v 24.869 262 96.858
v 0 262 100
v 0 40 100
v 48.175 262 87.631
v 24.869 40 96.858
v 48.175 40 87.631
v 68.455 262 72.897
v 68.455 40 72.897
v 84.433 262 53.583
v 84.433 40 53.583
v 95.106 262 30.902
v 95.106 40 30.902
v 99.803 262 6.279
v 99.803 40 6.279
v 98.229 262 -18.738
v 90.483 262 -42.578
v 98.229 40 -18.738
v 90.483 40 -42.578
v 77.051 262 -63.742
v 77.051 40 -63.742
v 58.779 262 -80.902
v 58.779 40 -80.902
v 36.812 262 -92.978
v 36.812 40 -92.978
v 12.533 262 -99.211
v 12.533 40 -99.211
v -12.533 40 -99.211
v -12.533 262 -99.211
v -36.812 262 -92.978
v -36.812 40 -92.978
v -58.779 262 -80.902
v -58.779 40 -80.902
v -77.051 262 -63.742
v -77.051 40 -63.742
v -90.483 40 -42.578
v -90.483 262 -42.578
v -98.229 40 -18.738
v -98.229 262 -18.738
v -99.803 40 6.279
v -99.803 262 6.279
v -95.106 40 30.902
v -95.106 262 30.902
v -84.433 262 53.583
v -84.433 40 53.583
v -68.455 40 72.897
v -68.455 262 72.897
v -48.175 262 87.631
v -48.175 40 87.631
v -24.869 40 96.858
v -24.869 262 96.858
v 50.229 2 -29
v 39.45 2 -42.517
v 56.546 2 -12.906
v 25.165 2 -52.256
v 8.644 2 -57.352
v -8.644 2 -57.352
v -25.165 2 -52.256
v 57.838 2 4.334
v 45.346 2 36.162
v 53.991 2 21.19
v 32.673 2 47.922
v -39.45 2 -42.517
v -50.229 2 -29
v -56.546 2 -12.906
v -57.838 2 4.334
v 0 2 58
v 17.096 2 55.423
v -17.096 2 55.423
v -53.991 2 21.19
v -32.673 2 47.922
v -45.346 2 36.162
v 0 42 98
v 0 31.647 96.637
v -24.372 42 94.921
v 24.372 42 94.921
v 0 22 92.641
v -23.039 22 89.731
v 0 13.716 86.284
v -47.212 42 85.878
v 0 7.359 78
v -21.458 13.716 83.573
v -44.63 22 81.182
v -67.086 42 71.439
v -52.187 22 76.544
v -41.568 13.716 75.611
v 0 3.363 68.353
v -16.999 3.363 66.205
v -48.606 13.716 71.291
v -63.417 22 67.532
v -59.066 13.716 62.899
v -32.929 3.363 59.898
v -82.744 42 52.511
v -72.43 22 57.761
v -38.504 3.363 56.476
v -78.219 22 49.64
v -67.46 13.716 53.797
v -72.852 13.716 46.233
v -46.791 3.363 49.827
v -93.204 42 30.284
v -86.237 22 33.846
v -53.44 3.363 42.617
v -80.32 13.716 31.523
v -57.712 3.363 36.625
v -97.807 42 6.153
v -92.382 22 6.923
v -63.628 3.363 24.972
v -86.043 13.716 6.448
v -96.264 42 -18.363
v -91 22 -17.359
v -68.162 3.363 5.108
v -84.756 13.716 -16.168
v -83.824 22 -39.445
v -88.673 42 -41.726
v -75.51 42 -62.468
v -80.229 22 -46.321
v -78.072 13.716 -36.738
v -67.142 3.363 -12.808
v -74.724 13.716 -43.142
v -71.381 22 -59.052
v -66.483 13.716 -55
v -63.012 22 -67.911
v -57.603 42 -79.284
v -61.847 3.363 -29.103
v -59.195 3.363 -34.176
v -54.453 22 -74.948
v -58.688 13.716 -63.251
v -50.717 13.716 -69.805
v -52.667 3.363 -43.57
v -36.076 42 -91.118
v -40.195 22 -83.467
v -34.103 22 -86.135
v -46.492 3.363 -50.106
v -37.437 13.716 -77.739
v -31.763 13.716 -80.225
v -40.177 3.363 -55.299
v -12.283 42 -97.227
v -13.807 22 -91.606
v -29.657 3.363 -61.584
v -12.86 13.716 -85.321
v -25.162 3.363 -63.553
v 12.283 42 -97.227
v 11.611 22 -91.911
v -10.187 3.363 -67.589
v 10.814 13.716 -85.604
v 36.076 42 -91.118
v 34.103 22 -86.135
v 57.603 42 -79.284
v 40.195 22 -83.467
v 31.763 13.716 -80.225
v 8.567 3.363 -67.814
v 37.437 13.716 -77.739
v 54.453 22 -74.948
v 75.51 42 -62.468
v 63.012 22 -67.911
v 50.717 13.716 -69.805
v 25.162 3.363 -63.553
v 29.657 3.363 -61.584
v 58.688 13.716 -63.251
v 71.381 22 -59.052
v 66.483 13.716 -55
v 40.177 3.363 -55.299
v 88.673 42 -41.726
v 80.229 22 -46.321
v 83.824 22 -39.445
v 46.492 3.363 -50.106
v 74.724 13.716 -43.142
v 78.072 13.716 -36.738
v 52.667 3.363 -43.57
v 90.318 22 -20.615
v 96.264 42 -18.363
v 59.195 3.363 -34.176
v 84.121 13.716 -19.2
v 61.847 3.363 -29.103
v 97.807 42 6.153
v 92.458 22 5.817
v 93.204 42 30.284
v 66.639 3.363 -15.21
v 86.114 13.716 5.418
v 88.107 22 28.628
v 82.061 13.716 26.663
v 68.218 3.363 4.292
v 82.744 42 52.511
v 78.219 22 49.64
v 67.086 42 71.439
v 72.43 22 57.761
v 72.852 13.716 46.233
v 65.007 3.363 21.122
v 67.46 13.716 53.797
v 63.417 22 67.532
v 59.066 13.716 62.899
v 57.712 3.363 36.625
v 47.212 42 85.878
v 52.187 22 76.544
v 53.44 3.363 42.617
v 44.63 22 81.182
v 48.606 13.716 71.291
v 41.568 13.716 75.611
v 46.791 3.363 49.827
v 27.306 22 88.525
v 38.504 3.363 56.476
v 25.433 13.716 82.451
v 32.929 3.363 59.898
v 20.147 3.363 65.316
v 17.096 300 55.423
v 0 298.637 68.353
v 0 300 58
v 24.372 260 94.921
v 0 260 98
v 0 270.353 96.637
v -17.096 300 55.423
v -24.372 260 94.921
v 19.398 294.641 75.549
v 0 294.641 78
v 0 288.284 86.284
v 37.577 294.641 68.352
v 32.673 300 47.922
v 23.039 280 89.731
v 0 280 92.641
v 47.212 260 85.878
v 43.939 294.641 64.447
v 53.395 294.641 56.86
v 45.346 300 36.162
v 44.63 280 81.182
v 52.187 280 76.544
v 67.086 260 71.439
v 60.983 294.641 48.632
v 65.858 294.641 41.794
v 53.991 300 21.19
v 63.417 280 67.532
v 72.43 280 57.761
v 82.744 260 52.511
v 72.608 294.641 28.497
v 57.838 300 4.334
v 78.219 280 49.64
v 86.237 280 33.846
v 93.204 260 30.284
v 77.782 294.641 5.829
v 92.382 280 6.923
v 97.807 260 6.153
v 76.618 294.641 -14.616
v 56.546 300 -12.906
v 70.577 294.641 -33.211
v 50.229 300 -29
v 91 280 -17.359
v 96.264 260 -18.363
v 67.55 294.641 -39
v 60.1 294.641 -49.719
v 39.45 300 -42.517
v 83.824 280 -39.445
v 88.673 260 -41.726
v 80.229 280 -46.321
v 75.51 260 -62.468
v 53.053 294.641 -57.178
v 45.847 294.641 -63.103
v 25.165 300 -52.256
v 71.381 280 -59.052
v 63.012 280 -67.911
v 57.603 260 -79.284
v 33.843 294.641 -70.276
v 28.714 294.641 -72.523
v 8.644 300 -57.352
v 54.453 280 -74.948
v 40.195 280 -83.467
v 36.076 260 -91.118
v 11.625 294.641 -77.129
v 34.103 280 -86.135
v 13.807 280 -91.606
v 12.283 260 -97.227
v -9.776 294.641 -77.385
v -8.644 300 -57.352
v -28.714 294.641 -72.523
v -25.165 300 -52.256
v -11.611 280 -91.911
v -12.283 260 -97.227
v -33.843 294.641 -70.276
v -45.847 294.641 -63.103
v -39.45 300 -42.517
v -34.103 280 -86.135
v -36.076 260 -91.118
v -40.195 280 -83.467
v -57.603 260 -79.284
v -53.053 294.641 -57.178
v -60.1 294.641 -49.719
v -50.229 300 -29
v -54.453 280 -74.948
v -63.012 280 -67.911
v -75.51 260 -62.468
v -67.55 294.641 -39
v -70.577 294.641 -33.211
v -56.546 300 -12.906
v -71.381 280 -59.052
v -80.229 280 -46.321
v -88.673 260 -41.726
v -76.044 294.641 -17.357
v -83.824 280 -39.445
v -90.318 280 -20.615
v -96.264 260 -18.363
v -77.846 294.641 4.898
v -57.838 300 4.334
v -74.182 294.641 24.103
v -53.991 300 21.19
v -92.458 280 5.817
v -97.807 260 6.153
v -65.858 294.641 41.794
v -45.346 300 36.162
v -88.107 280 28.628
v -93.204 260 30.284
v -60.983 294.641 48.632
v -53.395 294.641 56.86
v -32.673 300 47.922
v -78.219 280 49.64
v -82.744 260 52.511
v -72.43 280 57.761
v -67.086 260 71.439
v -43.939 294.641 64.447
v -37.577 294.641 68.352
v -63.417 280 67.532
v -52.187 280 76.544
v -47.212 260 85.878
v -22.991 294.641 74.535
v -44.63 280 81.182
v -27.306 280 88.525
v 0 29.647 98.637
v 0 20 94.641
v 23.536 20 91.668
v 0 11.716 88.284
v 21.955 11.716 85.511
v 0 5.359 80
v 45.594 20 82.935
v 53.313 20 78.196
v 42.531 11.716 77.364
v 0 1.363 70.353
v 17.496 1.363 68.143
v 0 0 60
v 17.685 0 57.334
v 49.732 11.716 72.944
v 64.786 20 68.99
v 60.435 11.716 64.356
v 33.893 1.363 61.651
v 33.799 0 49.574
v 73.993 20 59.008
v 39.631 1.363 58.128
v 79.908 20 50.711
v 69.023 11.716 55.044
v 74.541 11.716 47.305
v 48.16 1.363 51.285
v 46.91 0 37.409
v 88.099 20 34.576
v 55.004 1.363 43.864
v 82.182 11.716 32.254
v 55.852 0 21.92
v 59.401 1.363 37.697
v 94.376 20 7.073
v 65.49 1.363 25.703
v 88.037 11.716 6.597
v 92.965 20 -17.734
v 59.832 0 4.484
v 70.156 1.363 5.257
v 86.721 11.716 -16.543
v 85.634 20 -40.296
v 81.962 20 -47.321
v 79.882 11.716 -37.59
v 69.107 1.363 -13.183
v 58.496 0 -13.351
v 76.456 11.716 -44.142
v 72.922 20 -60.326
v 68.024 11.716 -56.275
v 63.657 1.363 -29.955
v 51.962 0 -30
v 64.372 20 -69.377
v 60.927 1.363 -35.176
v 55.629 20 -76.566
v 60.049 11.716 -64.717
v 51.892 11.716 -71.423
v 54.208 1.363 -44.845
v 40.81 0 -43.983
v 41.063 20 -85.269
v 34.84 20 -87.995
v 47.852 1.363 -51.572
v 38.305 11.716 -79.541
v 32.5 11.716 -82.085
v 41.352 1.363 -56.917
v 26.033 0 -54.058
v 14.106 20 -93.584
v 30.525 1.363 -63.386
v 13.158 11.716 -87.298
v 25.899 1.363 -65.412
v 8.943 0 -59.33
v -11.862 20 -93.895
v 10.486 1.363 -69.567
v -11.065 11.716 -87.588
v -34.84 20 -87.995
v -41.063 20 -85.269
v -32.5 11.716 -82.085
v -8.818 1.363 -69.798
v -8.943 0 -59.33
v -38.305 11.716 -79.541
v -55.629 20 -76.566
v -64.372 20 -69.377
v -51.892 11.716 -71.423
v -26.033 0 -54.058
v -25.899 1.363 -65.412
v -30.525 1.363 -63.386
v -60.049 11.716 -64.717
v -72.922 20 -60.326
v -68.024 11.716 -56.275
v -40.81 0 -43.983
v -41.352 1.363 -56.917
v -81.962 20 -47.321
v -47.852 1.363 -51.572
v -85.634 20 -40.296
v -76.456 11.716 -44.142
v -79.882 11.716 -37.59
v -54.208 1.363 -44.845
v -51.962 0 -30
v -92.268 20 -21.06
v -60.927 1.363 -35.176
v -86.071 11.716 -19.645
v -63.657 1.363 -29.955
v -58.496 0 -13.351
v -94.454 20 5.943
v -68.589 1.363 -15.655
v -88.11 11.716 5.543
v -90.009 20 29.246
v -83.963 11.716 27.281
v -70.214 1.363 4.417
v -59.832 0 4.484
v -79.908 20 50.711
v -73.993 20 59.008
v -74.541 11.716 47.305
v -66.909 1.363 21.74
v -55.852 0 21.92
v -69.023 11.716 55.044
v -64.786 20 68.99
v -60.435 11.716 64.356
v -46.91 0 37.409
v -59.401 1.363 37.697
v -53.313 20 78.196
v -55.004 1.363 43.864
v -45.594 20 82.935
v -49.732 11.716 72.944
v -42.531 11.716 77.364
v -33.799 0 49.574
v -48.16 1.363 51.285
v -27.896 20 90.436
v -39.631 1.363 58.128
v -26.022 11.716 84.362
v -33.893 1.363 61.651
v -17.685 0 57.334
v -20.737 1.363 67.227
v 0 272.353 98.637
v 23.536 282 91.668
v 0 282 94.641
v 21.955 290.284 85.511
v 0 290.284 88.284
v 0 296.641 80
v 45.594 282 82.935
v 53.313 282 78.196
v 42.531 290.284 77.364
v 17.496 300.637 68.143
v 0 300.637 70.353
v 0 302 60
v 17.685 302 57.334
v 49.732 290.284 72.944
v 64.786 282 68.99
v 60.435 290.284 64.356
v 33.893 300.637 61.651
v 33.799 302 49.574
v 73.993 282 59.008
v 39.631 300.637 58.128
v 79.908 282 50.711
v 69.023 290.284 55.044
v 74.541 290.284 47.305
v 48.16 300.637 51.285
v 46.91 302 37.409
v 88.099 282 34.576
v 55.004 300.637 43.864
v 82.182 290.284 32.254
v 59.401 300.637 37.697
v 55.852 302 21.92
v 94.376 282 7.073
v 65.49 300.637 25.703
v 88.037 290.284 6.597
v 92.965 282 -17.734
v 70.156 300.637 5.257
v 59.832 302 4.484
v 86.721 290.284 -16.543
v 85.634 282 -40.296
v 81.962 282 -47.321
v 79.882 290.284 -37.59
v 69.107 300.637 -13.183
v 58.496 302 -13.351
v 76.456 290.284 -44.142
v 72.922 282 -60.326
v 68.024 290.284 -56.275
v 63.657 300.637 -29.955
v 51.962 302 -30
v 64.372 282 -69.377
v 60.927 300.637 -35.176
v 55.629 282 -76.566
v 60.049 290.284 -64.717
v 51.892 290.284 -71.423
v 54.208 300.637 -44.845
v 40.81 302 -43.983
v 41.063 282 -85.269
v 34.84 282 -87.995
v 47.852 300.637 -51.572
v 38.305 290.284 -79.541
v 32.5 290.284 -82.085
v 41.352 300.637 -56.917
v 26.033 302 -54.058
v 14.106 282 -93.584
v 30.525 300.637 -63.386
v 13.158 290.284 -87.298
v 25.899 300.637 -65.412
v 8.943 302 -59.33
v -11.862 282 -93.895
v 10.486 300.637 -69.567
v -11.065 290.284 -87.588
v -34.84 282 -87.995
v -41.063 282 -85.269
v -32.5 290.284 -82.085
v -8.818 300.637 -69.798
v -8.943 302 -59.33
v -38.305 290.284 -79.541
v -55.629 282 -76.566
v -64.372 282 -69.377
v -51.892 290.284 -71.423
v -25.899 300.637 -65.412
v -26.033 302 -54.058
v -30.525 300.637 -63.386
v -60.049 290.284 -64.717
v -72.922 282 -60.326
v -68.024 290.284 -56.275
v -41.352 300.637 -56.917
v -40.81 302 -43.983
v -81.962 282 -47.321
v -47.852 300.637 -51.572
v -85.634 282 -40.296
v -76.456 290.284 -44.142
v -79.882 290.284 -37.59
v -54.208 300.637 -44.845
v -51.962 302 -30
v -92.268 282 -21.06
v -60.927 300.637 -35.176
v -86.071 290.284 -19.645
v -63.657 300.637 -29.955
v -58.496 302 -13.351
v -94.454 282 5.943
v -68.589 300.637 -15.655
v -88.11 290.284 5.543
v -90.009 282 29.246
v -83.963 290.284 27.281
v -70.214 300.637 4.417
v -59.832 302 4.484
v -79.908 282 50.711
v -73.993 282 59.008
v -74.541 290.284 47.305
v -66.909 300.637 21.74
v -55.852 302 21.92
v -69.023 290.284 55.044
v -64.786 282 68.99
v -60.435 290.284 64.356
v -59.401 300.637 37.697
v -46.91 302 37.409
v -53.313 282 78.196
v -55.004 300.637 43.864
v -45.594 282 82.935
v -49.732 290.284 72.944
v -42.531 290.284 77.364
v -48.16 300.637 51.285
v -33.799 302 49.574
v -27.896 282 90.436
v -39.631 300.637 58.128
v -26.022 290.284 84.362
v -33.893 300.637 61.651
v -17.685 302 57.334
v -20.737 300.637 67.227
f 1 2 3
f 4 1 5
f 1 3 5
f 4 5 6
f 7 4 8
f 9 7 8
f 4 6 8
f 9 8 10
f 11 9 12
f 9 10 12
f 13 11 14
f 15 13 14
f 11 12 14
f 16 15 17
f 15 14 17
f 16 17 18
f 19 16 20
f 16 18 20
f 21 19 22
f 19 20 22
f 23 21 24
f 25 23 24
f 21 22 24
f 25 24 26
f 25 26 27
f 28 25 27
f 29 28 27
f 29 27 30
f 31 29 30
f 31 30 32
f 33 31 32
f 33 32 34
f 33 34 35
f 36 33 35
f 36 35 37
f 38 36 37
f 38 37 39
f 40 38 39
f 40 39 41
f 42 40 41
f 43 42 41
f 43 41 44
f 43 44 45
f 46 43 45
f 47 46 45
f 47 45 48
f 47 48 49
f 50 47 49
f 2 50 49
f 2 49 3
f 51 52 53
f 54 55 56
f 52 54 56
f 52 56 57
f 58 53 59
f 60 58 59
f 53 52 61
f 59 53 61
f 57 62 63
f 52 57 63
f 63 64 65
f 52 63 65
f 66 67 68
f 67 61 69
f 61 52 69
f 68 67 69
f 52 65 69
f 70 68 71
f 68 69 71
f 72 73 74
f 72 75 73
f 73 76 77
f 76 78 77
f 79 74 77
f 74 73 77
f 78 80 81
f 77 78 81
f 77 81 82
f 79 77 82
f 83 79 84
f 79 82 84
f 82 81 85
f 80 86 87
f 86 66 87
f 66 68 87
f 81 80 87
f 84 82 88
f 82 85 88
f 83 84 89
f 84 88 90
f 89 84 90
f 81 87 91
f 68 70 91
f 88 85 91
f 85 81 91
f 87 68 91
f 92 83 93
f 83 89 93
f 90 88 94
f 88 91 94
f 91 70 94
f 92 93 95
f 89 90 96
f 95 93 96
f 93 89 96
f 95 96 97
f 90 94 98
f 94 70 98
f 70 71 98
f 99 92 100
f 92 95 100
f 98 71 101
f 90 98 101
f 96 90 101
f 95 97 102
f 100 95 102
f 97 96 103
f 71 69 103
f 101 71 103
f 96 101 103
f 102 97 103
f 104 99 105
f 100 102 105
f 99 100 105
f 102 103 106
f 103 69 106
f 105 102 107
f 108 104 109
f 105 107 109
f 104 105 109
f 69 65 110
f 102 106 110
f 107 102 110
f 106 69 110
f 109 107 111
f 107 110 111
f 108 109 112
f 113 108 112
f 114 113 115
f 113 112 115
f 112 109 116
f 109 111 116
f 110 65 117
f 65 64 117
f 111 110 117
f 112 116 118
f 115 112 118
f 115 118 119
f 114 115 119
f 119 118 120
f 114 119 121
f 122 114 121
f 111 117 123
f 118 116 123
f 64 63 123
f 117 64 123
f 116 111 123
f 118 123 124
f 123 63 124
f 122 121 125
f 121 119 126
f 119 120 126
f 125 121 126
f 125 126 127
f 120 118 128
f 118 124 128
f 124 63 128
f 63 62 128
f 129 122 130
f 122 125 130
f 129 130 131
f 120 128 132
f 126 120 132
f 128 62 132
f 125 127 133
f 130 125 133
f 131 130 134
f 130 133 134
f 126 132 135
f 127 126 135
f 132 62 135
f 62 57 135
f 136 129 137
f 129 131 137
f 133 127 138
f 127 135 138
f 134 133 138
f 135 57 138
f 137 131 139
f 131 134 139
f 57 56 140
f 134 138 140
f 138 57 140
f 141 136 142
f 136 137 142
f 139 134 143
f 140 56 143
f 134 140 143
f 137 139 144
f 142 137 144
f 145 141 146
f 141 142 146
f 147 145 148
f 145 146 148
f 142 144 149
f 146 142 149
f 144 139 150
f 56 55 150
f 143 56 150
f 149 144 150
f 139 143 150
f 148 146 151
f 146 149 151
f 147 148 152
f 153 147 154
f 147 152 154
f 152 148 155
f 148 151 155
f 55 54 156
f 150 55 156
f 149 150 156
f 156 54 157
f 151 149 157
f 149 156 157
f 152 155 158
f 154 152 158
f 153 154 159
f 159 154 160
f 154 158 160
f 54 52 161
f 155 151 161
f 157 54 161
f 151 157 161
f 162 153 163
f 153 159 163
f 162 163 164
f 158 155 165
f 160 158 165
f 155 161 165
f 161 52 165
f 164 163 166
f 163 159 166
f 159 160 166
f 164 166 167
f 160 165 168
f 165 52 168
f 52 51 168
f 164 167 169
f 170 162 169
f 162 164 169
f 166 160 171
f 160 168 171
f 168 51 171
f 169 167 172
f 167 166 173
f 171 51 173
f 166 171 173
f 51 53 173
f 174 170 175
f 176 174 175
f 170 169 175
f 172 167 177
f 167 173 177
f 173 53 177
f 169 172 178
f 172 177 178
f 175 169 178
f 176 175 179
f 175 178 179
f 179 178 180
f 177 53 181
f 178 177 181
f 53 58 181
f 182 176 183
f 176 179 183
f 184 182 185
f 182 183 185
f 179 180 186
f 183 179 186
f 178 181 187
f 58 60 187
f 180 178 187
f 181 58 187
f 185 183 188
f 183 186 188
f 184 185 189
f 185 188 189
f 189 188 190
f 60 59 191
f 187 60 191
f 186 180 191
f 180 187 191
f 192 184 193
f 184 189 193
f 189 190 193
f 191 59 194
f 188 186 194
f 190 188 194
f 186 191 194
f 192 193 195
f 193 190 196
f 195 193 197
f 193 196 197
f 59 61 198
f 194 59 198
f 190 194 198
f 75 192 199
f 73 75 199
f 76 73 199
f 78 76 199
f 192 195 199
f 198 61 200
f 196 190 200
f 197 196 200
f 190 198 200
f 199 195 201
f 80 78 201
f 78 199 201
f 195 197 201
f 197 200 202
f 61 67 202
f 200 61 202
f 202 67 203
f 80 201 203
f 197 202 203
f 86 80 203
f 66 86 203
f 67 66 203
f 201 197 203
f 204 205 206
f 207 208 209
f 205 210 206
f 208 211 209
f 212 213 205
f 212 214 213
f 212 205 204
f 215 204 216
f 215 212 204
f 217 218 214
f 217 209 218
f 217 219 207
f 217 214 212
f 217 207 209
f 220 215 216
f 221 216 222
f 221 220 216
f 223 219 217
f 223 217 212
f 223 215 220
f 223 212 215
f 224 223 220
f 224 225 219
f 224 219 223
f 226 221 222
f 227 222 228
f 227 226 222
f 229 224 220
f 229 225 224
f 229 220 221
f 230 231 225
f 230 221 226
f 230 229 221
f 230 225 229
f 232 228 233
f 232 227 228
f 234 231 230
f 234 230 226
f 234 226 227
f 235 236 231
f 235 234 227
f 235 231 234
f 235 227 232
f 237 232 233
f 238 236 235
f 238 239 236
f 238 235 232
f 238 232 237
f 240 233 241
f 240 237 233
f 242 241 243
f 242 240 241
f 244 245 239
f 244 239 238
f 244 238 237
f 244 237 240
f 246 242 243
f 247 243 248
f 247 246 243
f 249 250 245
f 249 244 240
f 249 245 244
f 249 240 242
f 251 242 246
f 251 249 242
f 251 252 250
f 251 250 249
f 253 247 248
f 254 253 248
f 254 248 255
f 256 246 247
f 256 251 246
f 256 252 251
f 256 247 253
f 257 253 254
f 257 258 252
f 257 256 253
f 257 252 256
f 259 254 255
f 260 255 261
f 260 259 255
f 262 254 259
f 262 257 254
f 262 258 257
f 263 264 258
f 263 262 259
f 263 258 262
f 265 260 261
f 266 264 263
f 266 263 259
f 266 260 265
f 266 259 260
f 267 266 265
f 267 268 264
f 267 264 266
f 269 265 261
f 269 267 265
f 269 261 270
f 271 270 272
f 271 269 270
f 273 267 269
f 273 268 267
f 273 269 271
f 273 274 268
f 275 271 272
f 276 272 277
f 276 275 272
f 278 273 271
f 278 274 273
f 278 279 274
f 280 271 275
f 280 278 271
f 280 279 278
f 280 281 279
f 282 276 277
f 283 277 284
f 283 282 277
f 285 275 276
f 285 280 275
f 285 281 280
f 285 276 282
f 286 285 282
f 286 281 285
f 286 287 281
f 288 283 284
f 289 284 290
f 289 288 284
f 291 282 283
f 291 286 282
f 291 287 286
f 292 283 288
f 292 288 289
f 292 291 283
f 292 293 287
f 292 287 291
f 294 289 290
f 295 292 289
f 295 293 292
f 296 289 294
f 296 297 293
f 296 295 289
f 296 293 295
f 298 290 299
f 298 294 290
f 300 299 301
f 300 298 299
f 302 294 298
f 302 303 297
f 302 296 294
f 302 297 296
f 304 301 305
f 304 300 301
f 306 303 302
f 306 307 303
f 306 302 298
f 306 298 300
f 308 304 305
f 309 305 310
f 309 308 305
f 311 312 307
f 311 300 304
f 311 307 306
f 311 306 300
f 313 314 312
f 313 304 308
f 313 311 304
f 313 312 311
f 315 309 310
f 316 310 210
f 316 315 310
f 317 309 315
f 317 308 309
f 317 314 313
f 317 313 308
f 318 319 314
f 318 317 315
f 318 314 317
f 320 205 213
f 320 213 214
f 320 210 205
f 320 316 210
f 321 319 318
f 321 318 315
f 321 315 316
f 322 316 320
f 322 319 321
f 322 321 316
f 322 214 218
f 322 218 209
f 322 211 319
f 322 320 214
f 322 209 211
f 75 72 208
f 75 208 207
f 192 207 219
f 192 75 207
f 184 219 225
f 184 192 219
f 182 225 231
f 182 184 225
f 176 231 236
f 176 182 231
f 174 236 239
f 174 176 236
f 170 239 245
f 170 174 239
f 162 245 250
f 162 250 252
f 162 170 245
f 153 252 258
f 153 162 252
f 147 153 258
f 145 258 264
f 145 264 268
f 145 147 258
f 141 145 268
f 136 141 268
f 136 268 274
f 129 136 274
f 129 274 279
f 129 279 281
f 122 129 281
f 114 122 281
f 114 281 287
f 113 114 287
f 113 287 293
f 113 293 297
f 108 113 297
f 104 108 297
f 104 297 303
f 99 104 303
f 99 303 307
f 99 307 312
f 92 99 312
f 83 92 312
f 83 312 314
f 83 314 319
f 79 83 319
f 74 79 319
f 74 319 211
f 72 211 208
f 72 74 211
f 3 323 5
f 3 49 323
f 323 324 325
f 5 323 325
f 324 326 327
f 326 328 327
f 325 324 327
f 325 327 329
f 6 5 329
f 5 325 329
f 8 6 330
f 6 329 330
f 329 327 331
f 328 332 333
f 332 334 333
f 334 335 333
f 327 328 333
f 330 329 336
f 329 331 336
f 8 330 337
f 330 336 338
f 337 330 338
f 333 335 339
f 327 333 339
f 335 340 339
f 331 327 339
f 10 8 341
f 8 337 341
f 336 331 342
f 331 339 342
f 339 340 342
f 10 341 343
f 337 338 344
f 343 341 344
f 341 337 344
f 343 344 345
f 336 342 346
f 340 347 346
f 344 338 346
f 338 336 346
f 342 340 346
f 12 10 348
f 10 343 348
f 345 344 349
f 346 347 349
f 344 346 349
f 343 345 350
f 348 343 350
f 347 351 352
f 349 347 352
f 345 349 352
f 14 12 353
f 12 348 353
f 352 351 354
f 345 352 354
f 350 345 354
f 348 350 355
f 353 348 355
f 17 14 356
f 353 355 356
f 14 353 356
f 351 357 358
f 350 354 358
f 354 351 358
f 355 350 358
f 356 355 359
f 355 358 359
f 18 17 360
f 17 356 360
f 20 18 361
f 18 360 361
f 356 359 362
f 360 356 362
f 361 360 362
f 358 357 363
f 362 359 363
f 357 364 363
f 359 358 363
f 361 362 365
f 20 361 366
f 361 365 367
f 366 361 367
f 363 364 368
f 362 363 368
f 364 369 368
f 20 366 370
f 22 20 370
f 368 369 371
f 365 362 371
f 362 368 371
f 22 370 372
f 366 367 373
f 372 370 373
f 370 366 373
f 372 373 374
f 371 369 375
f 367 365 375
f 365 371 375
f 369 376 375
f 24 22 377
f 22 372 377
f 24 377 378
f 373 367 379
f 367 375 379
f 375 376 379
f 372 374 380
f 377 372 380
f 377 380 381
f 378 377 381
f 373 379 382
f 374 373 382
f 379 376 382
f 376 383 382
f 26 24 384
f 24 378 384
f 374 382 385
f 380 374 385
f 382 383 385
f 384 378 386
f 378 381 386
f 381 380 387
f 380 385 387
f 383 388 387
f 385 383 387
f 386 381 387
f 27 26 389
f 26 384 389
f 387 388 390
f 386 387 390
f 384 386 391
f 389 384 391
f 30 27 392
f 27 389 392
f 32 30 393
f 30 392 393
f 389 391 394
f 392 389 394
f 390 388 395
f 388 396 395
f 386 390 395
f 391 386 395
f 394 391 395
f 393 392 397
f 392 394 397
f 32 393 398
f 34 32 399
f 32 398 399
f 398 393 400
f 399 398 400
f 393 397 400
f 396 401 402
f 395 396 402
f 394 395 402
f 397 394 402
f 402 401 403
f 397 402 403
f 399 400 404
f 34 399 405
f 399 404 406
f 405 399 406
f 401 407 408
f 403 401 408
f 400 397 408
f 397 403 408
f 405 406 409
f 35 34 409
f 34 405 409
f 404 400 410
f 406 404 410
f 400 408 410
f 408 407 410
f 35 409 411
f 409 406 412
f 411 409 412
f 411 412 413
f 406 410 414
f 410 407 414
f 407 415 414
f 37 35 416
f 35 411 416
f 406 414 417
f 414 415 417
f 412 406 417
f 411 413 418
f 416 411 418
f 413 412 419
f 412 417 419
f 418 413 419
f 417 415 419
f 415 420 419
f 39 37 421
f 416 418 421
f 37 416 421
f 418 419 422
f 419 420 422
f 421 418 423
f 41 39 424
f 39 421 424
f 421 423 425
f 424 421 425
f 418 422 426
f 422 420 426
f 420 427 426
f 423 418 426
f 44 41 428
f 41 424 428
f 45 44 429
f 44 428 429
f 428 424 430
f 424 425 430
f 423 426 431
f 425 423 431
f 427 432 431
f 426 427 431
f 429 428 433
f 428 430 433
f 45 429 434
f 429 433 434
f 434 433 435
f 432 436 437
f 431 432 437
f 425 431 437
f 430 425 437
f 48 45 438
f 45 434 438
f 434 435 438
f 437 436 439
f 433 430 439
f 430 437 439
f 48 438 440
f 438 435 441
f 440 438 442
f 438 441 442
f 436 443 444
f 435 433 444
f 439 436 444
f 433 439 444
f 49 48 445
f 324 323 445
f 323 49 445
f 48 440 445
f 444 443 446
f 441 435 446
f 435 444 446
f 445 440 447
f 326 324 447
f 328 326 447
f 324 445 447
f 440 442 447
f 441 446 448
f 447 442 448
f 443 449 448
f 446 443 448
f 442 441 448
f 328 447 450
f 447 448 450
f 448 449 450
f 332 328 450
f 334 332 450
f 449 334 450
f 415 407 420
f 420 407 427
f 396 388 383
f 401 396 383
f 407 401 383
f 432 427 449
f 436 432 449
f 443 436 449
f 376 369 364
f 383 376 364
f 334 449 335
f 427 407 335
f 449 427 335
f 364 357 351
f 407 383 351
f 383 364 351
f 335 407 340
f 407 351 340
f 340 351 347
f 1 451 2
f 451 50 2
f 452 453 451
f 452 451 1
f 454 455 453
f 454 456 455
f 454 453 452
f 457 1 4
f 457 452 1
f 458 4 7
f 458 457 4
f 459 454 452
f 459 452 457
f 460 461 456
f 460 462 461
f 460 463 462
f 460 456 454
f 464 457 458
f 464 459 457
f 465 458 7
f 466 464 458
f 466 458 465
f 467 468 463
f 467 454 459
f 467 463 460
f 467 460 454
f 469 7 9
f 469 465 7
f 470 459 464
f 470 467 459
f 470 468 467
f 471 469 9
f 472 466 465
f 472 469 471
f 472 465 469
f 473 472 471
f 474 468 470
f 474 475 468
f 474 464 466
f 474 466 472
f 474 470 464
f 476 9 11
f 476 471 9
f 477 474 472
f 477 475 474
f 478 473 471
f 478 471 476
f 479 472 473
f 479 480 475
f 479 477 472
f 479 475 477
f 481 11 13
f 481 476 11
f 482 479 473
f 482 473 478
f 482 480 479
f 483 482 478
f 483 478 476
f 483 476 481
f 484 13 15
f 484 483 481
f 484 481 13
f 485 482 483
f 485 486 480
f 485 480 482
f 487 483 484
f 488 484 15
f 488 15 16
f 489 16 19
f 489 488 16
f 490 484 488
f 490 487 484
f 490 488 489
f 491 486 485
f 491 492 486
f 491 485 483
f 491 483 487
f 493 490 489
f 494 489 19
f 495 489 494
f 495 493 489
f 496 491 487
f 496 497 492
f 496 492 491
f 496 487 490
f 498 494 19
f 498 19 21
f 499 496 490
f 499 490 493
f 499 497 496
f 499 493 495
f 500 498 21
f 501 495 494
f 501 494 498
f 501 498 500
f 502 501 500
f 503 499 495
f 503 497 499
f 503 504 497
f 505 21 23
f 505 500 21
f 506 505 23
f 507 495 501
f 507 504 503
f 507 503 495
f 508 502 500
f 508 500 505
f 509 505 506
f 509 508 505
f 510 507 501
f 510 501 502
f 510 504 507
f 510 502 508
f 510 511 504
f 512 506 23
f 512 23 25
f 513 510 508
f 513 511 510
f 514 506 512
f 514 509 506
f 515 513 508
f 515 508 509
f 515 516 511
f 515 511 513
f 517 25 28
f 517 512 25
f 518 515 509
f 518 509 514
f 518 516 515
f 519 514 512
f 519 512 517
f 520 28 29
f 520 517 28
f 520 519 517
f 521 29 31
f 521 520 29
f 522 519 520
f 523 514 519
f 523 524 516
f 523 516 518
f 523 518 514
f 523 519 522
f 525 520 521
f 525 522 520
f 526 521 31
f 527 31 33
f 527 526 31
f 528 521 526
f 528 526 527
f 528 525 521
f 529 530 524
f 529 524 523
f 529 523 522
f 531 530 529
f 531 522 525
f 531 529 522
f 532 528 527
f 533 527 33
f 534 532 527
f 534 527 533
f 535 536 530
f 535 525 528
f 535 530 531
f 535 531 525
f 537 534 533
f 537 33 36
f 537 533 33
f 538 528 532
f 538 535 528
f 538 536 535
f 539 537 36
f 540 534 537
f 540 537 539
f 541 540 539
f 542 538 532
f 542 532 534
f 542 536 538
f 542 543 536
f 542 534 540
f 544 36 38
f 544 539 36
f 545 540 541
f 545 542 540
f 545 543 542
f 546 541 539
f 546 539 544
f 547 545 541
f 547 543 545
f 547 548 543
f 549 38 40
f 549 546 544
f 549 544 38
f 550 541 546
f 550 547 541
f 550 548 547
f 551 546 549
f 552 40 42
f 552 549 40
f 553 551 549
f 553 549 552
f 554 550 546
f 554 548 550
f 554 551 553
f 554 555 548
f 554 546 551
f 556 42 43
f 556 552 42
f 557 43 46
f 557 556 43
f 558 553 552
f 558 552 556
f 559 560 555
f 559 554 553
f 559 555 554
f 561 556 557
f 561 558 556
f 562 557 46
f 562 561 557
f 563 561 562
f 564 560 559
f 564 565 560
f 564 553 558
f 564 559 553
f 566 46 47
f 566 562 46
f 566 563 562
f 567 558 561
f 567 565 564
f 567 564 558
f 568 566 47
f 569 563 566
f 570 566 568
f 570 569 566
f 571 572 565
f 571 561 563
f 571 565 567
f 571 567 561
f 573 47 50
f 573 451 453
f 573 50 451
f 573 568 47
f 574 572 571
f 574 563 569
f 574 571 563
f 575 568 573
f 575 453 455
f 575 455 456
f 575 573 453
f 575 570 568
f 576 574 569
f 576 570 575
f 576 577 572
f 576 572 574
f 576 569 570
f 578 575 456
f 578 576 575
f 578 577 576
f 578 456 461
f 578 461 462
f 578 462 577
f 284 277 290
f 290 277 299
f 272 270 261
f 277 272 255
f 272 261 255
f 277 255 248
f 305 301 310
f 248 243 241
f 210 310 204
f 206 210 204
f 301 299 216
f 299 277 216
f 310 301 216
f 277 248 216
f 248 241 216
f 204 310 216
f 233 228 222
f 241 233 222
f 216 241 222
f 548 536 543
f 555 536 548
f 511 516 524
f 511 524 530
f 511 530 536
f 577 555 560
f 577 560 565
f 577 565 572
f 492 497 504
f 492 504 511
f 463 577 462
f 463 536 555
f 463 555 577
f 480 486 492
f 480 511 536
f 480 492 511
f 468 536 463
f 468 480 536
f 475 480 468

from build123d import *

# Parameters (mm, degrees)
SKETCH1_R           = 100
SKETCH1_R_2         = 98
BOSS_EXTRUDE1_DEPTH = 300
SKETCH2_R           = 100
BOSS_EXTRUDE2_DEPTH = 2
SKETCH4_R           = 100
BOSS_EXTRUDE3_DEPTH = 2
FILLET1_R           = 40


with BuildPart() as part:
    # Sketch1 → Boss-Extrude1 (new body)
    with BuildSketch(Plane(origin=(0, 0, 0), x_dir=(1, 0, 0), z_dir=(0, 1, 0))):
        with Locations(Location((0, 0, 0), (0, 0, 270))):
            Circle(SKETCH1_R)
        with Locations(Location((0, 0, 0), (0, 0, 270))):
            Circle(SKETCH1_R_2, mode=Mode.SUBTRACT)
    extrude(amount=BOSS_EXTRUDE1_DEPTH)

    # Sketch2 → Boss-Extrude2 (add)
    with BuildSketch(Plane.XZ):
        with Locations(Location((0, 0, 0), (0, 0, 90))):
            Circle(SKETCH2_R)
    extrude(amount=-BOSS_EXTRUDE2_DEPTH)

    # Sketch4 → Boss-Extrude3 (add)
    with BuildSketch(Plane(origin=(0, 300, 0), x_dir=(1, 0, 0), z_dir=(0, 1, 0))):
        with Locations(Location((0, 0, 0), (0, 0, 270))):
            Circle(SKETCH4_R)
    extrude(amount=BOSS_EXTRUDE3_DEPTH)

    # Fillet1
    fillet1_edges = [part.edges().sort_by_distance(p)[0] for p in [
        (0, 2, -98),
        (0, 300, -98),
        (0, 302, -100),
        (0, 0, -100),
    ]]
    fillet(fillet1_edges, radius=FILLET1_R)


solid = part.part
